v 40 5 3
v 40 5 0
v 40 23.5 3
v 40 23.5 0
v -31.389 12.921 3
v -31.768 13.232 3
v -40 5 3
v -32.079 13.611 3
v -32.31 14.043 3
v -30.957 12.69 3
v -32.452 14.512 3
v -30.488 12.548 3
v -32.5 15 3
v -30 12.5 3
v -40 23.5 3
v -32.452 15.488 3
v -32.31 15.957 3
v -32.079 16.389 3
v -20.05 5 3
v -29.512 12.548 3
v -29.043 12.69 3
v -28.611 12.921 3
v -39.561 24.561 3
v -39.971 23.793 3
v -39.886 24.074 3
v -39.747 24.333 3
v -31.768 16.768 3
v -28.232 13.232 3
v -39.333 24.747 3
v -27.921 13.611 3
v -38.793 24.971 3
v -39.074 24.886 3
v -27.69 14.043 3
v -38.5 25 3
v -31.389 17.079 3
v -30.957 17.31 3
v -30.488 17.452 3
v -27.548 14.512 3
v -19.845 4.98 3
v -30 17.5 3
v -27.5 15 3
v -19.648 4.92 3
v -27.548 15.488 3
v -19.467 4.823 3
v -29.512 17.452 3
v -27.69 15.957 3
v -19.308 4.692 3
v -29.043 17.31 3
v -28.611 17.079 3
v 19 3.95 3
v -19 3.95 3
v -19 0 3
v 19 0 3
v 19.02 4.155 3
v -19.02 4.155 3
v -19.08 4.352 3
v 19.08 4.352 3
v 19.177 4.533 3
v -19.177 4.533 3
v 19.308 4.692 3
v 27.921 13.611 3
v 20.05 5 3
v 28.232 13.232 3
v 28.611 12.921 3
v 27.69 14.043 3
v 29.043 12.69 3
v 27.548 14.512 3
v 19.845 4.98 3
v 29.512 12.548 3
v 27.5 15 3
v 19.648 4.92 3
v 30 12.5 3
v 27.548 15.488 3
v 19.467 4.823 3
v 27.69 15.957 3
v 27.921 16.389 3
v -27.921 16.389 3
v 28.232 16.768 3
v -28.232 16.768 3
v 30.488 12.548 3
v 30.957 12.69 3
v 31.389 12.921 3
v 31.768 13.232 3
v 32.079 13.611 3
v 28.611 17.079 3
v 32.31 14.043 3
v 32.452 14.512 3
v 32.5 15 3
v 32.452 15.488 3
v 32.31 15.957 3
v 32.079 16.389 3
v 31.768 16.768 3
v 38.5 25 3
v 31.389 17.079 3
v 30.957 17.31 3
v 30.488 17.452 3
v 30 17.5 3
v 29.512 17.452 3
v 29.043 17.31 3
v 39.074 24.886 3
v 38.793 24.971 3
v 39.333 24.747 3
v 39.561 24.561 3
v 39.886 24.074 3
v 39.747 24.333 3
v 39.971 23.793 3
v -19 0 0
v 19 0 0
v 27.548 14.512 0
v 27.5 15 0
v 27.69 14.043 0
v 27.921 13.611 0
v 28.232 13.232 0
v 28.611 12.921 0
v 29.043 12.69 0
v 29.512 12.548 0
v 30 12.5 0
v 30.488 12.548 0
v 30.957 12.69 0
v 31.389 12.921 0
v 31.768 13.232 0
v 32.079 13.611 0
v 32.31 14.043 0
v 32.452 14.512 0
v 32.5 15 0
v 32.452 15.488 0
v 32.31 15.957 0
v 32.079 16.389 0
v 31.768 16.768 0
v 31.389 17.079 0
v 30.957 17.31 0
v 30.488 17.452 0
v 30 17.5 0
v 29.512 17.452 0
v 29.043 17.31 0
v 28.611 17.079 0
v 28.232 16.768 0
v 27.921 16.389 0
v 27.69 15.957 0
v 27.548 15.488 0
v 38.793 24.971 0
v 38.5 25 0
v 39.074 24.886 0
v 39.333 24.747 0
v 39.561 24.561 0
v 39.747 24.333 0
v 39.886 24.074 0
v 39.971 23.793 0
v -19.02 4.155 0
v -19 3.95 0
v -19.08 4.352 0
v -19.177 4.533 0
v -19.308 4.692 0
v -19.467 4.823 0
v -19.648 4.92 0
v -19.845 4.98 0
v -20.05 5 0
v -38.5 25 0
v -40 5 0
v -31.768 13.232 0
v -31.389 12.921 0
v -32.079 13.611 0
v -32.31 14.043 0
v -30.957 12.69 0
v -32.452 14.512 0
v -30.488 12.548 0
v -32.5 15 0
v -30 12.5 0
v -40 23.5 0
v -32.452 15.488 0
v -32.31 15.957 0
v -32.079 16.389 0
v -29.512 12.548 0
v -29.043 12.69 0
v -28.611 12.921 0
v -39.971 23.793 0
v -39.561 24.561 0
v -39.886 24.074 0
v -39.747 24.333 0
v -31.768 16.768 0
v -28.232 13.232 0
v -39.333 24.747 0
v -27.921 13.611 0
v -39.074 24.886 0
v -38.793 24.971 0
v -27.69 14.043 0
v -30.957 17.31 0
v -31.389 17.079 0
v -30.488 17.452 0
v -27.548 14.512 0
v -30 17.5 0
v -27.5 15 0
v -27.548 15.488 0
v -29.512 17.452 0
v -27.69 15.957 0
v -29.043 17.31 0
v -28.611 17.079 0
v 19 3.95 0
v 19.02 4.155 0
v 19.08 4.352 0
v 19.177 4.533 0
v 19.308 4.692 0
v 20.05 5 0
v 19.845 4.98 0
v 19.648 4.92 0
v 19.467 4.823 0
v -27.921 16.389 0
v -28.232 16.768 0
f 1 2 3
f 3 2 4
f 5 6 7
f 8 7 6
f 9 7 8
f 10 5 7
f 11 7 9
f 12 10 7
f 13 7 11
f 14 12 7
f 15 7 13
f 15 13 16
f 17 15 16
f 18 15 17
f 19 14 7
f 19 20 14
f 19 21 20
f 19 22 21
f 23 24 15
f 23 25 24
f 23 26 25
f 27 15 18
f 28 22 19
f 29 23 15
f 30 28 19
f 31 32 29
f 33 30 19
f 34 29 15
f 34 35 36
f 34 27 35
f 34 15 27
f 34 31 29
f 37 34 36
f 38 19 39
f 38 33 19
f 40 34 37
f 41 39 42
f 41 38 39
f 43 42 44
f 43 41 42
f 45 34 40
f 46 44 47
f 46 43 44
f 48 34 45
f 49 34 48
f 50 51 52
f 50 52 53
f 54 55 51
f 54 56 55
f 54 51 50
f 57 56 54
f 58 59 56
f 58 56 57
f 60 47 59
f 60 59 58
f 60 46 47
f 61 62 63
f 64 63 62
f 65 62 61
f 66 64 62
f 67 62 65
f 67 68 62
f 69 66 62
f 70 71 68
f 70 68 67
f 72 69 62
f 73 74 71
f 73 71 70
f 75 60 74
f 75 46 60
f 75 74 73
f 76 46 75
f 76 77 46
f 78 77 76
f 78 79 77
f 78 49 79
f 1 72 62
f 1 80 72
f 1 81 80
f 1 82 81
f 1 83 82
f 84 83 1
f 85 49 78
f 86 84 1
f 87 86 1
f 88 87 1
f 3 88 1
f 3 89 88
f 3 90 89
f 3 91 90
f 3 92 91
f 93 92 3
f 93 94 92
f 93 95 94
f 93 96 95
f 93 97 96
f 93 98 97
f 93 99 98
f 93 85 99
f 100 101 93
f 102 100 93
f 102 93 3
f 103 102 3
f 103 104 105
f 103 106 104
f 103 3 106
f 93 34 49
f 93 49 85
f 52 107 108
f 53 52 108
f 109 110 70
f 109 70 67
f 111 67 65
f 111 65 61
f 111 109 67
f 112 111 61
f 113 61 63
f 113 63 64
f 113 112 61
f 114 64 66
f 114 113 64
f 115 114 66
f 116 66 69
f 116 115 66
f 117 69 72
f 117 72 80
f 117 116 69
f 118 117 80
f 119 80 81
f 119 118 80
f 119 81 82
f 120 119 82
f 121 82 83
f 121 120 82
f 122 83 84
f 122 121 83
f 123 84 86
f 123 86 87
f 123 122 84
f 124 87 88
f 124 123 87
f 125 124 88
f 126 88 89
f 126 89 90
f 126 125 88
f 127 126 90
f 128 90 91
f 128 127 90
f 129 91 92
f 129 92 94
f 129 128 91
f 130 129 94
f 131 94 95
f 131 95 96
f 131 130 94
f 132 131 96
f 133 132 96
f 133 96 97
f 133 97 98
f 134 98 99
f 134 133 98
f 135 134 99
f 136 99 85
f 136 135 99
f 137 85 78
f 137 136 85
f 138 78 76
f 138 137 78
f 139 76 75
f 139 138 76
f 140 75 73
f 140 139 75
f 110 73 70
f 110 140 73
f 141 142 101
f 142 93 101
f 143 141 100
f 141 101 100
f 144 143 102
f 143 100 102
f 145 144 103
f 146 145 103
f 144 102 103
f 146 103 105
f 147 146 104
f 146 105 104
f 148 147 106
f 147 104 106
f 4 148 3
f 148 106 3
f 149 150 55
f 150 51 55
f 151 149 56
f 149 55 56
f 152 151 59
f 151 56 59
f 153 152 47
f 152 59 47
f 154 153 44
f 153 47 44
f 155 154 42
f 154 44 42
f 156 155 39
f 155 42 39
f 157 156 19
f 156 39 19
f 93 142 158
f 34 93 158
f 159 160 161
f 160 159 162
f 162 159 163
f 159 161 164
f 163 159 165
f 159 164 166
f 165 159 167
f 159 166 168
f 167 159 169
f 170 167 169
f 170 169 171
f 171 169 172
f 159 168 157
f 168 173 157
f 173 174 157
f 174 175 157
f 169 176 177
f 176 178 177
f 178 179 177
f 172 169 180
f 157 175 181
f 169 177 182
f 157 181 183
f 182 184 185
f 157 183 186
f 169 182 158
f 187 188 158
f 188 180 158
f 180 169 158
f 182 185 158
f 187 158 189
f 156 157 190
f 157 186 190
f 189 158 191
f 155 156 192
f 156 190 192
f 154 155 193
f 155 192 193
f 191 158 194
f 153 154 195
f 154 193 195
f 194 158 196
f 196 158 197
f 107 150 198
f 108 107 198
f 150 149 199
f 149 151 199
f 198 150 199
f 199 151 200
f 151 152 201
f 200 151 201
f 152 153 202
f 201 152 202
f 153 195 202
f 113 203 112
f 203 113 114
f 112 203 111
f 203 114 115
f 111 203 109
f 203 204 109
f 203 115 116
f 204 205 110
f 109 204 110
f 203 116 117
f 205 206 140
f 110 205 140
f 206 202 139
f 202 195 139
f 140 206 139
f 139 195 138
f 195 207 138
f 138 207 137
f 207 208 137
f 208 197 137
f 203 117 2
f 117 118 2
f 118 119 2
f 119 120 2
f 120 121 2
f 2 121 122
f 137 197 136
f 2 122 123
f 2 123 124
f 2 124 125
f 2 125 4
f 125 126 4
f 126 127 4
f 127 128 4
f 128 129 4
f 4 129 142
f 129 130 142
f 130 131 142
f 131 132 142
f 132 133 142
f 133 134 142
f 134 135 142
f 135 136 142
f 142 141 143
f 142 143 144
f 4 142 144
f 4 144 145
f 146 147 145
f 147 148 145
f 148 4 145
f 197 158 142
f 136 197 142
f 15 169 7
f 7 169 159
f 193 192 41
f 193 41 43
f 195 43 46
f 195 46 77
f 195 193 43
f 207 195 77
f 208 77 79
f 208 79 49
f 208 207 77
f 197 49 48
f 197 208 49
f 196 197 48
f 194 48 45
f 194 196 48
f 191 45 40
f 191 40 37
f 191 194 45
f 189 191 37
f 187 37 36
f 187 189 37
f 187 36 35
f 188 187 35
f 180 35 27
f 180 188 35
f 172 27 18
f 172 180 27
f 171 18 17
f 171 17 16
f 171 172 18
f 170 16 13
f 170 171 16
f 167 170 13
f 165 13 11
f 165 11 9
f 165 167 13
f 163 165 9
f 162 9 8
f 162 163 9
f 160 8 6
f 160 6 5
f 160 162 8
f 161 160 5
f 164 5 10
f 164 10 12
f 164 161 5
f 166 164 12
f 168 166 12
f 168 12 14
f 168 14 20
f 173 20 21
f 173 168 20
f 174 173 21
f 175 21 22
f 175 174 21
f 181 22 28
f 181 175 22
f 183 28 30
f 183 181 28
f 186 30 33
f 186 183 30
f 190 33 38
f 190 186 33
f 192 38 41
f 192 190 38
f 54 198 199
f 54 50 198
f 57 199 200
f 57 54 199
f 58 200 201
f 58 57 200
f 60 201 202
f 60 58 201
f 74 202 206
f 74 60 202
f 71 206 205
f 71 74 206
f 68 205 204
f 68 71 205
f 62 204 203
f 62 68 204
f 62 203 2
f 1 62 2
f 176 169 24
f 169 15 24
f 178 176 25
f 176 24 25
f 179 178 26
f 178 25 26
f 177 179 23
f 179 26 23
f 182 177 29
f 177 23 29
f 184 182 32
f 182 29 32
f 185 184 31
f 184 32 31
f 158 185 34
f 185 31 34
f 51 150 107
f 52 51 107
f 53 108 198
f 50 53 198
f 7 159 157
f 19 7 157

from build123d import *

# Parameters (mm, degrees)
SKETCH_1_R      = 2.5
EXTRUDE_1_DEPTH = 3
FILLET_1_R      = 1.05
FILLET_2_R      = 1.5


with BuildPart() as part:
    # ｽｹｯﾁ1 → ﾎﾞｽ - 押し出し1 (new body)
    with BuildSketch(Plane.XY):
        Polygon((-19, 0), (19, 0), (19, 5), (40, 5), (40, 25), (-40, 25), (-40, 5), (-19, 5), align=None)
        with Locations((-30, 15)):
            Circle(SKETCH_1_R, mode=Mode.SUBTRACT)
        with Locations(Location((30, 15, 0), (0, 0, 180))):
            Circle(SKETCH_1_R, mode=Mode.SUBTRACT)
    extrude(amount=EXTRUDE_1_DEPTH)

    # ﾌｨﾚｯﾄ1
    fillet_1_edges = [part.edges().sort_by_distance(p)[0] for p in [
        (-19, 5, 1.5),
        (19, 5, 1.5),
    ]]
    fillet(fillet_1_edges, radius=FILLET_1_R)

    # ﾌｨﾚｯﾄ2
    fillet_2_edges = [part.edges().sort_by_distance(p)[0] for p in [
        (-40, 25, 1.5),
        (40, 25, 1.5),
    ]]
    fillet(fillet_2_edges, radius=FILLET_2_R)


solid = part.part
